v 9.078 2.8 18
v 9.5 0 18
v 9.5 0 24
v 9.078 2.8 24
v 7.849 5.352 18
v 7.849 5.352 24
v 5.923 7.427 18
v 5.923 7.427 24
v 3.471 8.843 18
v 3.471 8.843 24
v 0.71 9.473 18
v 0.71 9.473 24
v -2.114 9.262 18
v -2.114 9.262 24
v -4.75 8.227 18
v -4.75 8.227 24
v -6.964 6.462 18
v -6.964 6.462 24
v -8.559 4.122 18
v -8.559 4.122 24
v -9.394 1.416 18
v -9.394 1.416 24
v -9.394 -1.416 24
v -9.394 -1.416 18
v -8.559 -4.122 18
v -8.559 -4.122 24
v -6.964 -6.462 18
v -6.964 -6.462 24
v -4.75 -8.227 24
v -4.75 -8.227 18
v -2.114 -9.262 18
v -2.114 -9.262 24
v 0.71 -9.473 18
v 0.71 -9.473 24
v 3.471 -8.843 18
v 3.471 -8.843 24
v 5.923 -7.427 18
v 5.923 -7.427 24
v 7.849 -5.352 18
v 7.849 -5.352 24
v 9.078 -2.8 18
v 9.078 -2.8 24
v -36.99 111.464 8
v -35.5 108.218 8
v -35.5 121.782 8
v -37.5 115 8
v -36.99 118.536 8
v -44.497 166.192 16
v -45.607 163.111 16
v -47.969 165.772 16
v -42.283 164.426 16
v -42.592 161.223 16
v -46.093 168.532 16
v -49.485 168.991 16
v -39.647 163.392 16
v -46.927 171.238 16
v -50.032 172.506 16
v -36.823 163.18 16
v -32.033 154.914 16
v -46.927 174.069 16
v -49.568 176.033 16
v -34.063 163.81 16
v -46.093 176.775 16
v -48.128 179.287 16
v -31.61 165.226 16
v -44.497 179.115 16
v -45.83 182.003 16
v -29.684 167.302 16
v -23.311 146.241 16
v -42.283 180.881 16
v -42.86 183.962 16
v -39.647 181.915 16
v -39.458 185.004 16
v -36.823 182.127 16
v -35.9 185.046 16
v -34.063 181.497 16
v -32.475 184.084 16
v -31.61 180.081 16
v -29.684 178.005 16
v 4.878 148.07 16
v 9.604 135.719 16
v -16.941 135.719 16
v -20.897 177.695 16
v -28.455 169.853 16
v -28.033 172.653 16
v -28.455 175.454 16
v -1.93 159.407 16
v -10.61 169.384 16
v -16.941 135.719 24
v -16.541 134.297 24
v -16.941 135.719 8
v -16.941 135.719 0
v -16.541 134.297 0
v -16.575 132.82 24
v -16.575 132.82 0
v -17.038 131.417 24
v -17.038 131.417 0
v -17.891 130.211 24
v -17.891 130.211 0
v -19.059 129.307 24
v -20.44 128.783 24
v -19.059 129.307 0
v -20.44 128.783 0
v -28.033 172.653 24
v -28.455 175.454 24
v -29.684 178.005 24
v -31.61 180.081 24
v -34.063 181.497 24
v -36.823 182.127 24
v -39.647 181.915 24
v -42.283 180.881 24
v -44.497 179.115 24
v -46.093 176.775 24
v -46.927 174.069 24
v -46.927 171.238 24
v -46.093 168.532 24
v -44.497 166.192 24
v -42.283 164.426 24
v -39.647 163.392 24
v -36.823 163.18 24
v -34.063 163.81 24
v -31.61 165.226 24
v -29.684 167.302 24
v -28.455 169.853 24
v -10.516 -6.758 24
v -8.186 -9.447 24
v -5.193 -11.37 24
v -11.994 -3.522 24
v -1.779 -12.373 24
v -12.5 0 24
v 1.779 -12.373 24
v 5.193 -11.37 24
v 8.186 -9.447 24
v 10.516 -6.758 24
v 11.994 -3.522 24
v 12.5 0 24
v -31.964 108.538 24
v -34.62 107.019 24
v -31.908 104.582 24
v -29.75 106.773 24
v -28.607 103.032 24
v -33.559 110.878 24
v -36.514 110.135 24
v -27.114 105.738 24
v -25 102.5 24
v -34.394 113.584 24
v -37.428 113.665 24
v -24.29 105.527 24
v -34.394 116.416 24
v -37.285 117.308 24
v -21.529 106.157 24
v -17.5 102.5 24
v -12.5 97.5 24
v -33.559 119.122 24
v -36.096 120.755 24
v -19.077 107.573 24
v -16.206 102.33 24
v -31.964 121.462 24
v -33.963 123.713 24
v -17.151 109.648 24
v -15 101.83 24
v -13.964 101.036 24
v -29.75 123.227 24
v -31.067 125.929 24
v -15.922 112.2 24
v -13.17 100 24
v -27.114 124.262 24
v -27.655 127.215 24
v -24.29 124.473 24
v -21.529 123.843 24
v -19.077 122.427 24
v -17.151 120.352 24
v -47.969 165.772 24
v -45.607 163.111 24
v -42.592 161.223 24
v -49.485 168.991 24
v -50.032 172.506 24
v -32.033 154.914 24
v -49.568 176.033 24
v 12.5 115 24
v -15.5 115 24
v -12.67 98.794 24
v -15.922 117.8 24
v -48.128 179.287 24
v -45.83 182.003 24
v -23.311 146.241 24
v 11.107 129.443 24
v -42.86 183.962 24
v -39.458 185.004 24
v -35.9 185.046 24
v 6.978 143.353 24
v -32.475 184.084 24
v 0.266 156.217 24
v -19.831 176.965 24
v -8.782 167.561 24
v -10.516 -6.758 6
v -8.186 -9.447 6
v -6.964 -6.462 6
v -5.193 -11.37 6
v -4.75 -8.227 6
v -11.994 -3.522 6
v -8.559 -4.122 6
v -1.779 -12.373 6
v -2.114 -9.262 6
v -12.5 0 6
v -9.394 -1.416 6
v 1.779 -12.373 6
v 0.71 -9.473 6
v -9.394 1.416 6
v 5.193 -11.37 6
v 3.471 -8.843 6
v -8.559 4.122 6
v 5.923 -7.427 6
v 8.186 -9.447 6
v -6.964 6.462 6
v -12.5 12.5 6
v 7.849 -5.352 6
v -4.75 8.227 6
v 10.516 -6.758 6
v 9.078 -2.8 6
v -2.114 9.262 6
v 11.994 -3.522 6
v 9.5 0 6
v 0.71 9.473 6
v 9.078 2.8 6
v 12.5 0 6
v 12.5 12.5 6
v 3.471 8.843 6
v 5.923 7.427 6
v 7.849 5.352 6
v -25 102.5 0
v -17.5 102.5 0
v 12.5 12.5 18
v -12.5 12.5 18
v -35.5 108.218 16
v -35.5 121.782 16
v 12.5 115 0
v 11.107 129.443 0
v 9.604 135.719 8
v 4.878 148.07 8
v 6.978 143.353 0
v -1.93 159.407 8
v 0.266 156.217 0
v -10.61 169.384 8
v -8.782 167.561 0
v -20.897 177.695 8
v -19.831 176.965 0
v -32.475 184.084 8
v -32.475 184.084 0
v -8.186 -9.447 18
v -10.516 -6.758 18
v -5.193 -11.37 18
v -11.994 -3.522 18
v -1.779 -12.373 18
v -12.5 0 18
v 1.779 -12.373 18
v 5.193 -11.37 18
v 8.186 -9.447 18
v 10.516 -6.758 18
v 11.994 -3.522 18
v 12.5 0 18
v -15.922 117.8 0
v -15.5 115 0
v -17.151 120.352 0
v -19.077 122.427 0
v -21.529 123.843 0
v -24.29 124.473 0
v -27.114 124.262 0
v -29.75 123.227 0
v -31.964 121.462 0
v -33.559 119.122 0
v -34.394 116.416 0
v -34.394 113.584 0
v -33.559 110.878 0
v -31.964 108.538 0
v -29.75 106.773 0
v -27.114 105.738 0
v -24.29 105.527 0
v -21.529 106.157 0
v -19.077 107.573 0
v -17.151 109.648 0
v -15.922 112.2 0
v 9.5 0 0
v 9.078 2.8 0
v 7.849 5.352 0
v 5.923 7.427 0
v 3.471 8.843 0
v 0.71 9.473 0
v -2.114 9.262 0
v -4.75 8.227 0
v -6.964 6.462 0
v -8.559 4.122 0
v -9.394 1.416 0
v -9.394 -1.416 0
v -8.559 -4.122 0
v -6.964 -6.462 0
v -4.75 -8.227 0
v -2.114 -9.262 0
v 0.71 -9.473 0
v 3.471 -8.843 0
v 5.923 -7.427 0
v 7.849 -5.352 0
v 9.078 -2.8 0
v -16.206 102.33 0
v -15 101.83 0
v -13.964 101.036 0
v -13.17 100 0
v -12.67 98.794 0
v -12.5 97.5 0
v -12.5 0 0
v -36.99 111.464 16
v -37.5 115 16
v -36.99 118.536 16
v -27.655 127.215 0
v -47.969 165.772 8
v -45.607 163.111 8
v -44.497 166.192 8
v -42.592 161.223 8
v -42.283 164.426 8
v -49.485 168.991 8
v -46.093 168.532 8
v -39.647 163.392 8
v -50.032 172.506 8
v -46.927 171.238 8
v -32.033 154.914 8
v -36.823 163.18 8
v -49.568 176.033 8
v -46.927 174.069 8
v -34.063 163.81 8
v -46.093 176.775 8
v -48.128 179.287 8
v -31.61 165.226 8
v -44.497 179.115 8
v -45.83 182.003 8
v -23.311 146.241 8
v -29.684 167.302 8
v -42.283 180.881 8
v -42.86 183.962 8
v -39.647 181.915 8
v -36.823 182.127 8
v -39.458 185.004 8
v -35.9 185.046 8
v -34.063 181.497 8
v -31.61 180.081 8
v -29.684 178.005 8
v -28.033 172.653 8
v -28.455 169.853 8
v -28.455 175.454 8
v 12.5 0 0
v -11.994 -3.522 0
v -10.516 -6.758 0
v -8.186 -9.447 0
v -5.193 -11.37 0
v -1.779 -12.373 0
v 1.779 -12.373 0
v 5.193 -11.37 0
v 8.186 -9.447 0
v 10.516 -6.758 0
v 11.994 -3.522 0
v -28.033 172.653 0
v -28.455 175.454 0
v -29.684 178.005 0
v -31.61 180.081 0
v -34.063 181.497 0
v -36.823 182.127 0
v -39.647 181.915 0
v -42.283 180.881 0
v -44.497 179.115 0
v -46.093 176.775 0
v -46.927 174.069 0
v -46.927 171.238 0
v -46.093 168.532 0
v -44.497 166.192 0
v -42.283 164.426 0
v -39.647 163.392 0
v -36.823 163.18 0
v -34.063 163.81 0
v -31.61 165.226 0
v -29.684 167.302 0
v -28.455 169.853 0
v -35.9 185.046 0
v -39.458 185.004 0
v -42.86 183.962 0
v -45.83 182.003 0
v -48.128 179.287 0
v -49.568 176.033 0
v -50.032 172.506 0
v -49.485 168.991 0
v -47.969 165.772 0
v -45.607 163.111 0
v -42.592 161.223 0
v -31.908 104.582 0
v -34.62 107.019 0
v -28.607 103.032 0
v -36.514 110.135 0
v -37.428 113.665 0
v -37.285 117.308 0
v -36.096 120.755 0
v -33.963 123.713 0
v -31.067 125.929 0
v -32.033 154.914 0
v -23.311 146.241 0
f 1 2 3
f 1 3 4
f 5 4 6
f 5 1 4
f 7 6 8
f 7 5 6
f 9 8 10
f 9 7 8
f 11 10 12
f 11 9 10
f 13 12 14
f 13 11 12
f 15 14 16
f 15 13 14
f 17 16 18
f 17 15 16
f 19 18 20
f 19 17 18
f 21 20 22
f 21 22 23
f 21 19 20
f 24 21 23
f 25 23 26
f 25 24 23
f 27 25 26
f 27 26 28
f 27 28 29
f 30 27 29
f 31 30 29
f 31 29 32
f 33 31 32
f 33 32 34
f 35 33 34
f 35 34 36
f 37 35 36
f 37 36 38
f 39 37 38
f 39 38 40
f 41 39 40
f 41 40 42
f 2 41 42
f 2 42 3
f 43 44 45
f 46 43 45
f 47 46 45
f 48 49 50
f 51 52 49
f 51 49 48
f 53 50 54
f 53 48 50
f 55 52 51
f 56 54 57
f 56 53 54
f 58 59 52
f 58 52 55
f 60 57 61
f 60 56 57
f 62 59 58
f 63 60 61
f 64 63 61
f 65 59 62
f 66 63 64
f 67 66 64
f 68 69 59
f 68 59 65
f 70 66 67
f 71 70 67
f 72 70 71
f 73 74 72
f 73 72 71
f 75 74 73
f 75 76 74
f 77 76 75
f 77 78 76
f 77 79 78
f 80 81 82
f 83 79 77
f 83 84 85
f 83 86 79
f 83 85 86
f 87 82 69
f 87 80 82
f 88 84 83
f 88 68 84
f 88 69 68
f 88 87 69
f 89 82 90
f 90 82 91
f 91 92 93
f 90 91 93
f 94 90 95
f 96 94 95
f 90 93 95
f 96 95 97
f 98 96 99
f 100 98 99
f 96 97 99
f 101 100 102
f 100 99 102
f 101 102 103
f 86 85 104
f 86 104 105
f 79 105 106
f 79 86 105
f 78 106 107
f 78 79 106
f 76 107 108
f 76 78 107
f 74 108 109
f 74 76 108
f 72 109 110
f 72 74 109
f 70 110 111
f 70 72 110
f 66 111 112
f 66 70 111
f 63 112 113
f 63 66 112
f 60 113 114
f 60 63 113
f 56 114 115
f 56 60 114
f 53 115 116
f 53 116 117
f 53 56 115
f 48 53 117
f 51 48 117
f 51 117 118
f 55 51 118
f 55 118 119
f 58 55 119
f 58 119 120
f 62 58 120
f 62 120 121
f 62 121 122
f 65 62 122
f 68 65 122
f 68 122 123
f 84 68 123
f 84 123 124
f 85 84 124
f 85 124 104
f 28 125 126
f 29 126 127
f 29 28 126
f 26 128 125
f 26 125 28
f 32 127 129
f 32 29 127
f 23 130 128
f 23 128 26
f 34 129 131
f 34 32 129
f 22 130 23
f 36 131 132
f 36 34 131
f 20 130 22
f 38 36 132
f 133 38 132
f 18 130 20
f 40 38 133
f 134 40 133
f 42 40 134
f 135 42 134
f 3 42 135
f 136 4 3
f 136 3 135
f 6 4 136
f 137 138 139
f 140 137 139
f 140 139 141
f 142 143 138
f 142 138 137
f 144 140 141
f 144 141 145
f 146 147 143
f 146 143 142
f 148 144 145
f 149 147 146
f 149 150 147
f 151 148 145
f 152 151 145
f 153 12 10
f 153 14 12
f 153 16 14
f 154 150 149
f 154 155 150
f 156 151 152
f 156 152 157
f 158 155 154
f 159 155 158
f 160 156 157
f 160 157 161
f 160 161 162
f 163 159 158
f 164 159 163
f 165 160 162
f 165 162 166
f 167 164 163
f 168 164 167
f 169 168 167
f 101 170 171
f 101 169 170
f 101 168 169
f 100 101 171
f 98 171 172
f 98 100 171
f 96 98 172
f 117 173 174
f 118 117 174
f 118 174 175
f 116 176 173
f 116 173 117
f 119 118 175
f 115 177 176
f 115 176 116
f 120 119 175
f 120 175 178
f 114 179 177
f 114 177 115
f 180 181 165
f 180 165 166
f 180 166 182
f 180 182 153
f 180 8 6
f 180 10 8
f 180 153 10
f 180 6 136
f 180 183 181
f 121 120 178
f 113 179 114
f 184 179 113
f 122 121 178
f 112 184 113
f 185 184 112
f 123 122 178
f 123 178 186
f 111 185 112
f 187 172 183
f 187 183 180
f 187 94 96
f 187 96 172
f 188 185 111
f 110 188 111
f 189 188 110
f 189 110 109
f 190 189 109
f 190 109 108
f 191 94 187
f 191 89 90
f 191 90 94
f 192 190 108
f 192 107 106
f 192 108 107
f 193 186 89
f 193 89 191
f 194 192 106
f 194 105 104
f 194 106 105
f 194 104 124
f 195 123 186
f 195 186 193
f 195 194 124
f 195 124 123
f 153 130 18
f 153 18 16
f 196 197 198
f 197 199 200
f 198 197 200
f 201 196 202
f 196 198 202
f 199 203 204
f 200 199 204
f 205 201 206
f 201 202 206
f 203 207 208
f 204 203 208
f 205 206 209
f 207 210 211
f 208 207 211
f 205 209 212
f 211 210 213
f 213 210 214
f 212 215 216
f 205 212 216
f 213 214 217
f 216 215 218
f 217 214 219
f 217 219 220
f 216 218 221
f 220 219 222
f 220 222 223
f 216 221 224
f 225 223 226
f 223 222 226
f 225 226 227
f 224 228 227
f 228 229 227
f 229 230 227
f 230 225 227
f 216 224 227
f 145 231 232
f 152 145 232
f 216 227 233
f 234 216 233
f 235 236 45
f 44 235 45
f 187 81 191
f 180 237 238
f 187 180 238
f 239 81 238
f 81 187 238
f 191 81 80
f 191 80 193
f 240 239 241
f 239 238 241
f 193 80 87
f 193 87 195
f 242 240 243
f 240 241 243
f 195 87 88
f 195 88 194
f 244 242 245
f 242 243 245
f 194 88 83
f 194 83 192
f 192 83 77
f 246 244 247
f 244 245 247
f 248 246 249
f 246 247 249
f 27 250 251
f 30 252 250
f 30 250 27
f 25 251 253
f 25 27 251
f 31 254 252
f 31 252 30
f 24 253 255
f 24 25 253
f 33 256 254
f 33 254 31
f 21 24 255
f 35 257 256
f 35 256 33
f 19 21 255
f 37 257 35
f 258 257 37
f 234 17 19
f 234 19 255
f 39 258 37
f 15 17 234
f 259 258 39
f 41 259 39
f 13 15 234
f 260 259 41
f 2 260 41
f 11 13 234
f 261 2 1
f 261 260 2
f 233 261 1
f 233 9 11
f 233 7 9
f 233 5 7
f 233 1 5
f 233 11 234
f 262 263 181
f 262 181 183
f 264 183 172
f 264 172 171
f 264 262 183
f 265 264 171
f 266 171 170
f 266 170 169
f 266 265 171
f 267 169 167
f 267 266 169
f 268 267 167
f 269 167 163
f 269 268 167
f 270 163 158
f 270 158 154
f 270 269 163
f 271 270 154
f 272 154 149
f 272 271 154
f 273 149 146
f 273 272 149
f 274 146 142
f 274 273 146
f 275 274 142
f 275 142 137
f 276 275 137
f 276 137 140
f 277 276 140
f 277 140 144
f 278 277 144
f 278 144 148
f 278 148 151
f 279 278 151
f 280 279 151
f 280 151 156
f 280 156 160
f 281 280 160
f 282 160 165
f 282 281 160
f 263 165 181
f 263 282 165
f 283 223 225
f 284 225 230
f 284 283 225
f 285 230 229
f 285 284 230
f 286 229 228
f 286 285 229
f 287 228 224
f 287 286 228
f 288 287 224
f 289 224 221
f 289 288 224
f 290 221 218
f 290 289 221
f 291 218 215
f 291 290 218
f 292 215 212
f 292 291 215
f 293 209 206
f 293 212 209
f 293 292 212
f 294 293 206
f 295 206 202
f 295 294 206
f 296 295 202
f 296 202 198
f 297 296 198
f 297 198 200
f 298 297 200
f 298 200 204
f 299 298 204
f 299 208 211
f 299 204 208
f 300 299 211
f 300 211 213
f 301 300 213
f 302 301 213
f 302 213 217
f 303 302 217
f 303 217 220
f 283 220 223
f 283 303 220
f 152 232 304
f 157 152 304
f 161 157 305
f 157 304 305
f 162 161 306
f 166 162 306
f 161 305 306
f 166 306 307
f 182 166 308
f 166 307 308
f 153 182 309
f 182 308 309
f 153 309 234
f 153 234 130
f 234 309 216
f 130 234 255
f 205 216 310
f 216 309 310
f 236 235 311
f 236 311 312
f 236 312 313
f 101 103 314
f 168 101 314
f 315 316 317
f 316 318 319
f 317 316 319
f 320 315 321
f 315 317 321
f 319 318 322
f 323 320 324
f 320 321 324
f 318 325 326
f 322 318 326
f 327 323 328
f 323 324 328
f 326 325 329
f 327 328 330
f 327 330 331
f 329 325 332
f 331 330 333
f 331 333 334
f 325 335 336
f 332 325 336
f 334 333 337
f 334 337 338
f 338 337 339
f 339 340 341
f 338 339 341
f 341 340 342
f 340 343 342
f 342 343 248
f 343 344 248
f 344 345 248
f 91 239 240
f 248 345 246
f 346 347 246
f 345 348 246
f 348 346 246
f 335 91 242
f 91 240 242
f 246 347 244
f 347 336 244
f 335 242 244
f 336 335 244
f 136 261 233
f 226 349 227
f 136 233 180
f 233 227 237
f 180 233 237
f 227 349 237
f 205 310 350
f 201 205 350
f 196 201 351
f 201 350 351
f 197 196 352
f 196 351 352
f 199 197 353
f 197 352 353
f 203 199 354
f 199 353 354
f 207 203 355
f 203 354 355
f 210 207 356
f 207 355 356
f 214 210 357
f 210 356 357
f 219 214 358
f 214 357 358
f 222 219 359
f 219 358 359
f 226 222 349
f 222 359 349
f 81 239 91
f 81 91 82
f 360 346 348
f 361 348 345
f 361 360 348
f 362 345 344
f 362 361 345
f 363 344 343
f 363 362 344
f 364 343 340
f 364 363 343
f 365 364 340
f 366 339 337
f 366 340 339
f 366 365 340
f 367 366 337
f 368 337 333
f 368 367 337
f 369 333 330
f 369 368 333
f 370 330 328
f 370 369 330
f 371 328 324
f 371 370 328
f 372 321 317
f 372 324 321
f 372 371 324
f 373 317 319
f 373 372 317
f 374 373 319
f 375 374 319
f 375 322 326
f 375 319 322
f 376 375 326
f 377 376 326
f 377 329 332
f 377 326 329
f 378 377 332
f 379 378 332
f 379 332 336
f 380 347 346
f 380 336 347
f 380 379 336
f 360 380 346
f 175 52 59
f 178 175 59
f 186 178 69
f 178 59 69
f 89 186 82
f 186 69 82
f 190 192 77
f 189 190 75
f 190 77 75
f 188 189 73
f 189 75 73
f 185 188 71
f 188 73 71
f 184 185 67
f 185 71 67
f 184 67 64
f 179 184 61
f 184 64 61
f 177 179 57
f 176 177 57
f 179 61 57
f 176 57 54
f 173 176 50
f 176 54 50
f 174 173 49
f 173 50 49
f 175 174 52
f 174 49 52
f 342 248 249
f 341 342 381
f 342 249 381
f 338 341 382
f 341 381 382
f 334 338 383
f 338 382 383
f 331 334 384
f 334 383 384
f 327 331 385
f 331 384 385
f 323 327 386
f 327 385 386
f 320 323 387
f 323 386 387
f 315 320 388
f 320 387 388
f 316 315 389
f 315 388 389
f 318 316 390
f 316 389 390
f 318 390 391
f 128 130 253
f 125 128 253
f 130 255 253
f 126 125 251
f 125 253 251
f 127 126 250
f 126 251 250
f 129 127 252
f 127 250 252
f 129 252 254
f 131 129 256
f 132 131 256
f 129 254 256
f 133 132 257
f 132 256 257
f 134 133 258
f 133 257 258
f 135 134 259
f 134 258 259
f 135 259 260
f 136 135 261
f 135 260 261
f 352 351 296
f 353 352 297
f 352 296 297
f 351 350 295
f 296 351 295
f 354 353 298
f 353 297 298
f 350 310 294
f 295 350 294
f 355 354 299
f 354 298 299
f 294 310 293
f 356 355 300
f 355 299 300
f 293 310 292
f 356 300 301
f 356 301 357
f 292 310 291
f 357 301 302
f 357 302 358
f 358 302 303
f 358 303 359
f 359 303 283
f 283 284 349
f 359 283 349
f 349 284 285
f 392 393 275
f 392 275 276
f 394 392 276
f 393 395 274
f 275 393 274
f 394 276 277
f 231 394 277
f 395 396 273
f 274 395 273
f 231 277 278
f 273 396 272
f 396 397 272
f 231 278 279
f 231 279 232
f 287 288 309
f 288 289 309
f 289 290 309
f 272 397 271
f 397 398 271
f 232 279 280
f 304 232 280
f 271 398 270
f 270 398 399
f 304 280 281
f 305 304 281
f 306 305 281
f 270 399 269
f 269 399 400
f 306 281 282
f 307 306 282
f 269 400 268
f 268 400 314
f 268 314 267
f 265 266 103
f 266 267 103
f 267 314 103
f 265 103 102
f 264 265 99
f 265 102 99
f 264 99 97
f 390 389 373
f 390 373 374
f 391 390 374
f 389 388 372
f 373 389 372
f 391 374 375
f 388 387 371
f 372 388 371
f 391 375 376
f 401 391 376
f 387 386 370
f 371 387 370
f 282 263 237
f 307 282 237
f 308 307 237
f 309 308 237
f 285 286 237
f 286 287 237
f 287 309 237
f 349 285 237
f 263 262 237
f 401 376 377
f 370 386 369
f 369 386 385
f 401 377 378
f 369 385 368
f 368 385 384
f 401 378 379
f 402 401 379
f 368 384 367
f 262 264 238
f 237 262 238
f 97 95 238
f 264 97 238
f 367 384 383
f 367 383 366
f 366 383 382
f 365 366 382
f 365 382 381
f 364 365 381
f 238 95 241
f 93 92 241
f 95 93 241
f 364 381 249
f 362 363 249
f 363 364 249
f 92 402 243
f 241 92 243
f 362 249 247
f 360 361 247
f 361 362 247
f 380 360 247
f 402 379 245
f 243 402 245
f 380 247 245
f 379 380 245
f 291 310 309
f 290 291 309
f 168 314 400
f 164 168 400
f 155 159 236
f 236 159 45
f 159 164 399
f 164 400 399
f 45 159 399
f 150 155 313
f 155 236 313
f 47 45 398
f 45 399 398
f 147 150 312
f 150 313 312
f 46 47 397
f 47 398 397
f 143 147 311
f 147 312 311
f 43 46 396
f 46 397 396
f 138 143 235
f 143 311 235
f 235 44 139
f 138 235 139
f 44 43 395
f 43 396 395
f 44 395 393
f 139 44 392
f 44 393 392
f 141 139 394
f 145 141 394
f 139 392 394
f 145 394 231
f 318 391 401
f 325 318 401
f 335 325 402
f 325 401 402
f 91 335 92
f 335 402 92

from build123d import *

# Parameters (mm, degrees)
CROQUIS2_R                 = 12.5
CROQUIS2_R_2               = 9.5
SALIENTE_EXTRUIR1_DEPTH    = 24
CORTAR_EXTRUIR3_DEPTH      = 191.437747955
CORTAR_EXTRUIR3_DEPTH_BACK = 191.437747955
CROQUIS5_W                 = 8
CROQUIS5_H                 = 49.434743854
CORTAR_EXTRUIR4_DEPTH      = 191.437747955
CORTAR_EXTRUIR4_DEPTH_BACK = 191.437747955
CROQUIS6_W                 = 12
CROQUIS6_H                 = 25
CORTAR_EXTRUIR5_DEPTH      = 159.265939688
CORTAR_EXTRUIR5_DEPTH_BACK = 159.265939688
CROQUIS7_W                 = 14.533349016
CROQUIS7_H                 = 8


with BuildPart() as part:
    # Croquis2 → Saliente-Extruir1 (new body)
    # profile 1 of 4: a face of its own
    with BuildSketch(Plane.XY):
        with Locations((-37.533349016, 172.653405471)):
            Circle(CROQUIS2_R)
        with Locations((-37.533349016, 172.653405471)):
            Circle(CROQUIS2_R_2, mode=Mode.SUBTRACT)
    # profile 2 of 4: a face of its own
    with BuildSketch(Plane.XY):
        with BuildLine():
            Line((-12.5, 58.855421297), (-12.5, 0))
            ThreePointArc((-12.5, 0), (0, 12.5), (12.5, 0))
            Line((12.5, 0), (12.5, 115))
            ThreePointArc((12.5, 115), (0.265693313, 156.217157525), (-32.475079629, 184.08423706))
            ThreePointArc((-32.475079629, 184.08423706), (-27.057701844, 179.473289366), (-25.033349016, 172.653405471))
            ThreePointArc((-25.033349016, 172.653405471), (-30.713465121, 162.1777583), (-42.591618403, 161.222573883))
            ThreePointArc((-42.591618403, 161.222573883), (-27.406897086, 150.843693068), (-16.941222141, 135.718661617))
            ThreePointArc((-16.941222141, 135.718661617), (-17.037727548, 131.417260647), (-20.439743892, 128.783319041))
            Line((-20.439743892, 128.783319041), (-27.655370554, 127.214704549))
            ThreePointArc((-27.655370554, 127.214704549), (-17.155961879, 124.732474812), (-12.5, 115))
            ThreePointArc((-12.5, 115), (-16.161165235, 106.161165235), (-25, 102.5))
            Line((-25, 102.5), (-17.5, 102.5))
            ThreePointArc((-17.5, 102.5), (-13.964466094, 101.035533906), (-12.5, 97.5))
            Line((-12.5, 97.5), (-12.5, 58.855421297))
        make_face()
    # profile 3 of 4: a face of its own
    with BuildSketch(Plane.XY):
        with Locations((-25, 115)):
            Circle(CROQUIS2_R)
        with Locations((-25, 115)):
            Circle(CROQUIS2_R_2, mode=Mode.SUBTRACT)
    # profile 4 of 4: a face of its own
    with BuildSketch(Plane.XY):
        Circle(CROQUIS2_R)
        Circle(CROQUIS2_R_2, mode=Mode.SUBTRACT)
    extrude(amount=SALIENTE_EXTRUIR1_DEPTH)

    # Croquis5 → Cortar-Extruir3 (cut, two sides: drawn at the far end of the back side and taken through both)
    with BuildSketch(Plane.ZY.offset(12.5).offset(-CORTAR_EXTRUIR3_DEPTH_BACK)):
        with Locations((12, 160.436033544)):
            Rectangle(CROQUIS5_W, CROQUIS5_H)
    extrude(amount=CORTAR_EXTRUIR3_DEPTH + CORTAR_EXTRUIR3_DEPTH_BACK, mode=Mode.SUBTRACT)

    # Croquis6 → Cortar-Extruir4 (cut, two sides: drawn at the far end of the back side and taken through both)
    with BuildSketch(Plane.ZY.offset(12.5).offset(-CORTAR_EXTRUIR4_DEPTH_BACK)):
        with Locations((12, 0)):
            Rectangle(CROQUIS6_W, CROQUIS6_H)
    extrude(amount=CORTAR_EXTRUIR4_DEPTH + CORTAR_EXTRUIR4_DEPTH_BACK, mode=Mode.SUBTRACT)

    # Croquis7 → Cortar-Extruir5 (cut, two sides: drawn at the far end of the back side and taken through both)
    with BuildSketch(Plane(origin=(0, 135.718661617, 0), x_dir=(1, 0, 0), z_dir=(0, 1, 0)).offset(-CORTAR_EXTRUIR5_DEPTH_BACK)):
        with Locations((-42.766674508, -12)):
            Rectangle(CROQUIS7_W, CROQUIS7_H)
    extrude(amount=CORTAR_EXTRUIR5_DEPTH + CORTAR_EXTRUIR5_DEPTH_BACK, mode=Mode.SUBTRACT)


solid = part.part
